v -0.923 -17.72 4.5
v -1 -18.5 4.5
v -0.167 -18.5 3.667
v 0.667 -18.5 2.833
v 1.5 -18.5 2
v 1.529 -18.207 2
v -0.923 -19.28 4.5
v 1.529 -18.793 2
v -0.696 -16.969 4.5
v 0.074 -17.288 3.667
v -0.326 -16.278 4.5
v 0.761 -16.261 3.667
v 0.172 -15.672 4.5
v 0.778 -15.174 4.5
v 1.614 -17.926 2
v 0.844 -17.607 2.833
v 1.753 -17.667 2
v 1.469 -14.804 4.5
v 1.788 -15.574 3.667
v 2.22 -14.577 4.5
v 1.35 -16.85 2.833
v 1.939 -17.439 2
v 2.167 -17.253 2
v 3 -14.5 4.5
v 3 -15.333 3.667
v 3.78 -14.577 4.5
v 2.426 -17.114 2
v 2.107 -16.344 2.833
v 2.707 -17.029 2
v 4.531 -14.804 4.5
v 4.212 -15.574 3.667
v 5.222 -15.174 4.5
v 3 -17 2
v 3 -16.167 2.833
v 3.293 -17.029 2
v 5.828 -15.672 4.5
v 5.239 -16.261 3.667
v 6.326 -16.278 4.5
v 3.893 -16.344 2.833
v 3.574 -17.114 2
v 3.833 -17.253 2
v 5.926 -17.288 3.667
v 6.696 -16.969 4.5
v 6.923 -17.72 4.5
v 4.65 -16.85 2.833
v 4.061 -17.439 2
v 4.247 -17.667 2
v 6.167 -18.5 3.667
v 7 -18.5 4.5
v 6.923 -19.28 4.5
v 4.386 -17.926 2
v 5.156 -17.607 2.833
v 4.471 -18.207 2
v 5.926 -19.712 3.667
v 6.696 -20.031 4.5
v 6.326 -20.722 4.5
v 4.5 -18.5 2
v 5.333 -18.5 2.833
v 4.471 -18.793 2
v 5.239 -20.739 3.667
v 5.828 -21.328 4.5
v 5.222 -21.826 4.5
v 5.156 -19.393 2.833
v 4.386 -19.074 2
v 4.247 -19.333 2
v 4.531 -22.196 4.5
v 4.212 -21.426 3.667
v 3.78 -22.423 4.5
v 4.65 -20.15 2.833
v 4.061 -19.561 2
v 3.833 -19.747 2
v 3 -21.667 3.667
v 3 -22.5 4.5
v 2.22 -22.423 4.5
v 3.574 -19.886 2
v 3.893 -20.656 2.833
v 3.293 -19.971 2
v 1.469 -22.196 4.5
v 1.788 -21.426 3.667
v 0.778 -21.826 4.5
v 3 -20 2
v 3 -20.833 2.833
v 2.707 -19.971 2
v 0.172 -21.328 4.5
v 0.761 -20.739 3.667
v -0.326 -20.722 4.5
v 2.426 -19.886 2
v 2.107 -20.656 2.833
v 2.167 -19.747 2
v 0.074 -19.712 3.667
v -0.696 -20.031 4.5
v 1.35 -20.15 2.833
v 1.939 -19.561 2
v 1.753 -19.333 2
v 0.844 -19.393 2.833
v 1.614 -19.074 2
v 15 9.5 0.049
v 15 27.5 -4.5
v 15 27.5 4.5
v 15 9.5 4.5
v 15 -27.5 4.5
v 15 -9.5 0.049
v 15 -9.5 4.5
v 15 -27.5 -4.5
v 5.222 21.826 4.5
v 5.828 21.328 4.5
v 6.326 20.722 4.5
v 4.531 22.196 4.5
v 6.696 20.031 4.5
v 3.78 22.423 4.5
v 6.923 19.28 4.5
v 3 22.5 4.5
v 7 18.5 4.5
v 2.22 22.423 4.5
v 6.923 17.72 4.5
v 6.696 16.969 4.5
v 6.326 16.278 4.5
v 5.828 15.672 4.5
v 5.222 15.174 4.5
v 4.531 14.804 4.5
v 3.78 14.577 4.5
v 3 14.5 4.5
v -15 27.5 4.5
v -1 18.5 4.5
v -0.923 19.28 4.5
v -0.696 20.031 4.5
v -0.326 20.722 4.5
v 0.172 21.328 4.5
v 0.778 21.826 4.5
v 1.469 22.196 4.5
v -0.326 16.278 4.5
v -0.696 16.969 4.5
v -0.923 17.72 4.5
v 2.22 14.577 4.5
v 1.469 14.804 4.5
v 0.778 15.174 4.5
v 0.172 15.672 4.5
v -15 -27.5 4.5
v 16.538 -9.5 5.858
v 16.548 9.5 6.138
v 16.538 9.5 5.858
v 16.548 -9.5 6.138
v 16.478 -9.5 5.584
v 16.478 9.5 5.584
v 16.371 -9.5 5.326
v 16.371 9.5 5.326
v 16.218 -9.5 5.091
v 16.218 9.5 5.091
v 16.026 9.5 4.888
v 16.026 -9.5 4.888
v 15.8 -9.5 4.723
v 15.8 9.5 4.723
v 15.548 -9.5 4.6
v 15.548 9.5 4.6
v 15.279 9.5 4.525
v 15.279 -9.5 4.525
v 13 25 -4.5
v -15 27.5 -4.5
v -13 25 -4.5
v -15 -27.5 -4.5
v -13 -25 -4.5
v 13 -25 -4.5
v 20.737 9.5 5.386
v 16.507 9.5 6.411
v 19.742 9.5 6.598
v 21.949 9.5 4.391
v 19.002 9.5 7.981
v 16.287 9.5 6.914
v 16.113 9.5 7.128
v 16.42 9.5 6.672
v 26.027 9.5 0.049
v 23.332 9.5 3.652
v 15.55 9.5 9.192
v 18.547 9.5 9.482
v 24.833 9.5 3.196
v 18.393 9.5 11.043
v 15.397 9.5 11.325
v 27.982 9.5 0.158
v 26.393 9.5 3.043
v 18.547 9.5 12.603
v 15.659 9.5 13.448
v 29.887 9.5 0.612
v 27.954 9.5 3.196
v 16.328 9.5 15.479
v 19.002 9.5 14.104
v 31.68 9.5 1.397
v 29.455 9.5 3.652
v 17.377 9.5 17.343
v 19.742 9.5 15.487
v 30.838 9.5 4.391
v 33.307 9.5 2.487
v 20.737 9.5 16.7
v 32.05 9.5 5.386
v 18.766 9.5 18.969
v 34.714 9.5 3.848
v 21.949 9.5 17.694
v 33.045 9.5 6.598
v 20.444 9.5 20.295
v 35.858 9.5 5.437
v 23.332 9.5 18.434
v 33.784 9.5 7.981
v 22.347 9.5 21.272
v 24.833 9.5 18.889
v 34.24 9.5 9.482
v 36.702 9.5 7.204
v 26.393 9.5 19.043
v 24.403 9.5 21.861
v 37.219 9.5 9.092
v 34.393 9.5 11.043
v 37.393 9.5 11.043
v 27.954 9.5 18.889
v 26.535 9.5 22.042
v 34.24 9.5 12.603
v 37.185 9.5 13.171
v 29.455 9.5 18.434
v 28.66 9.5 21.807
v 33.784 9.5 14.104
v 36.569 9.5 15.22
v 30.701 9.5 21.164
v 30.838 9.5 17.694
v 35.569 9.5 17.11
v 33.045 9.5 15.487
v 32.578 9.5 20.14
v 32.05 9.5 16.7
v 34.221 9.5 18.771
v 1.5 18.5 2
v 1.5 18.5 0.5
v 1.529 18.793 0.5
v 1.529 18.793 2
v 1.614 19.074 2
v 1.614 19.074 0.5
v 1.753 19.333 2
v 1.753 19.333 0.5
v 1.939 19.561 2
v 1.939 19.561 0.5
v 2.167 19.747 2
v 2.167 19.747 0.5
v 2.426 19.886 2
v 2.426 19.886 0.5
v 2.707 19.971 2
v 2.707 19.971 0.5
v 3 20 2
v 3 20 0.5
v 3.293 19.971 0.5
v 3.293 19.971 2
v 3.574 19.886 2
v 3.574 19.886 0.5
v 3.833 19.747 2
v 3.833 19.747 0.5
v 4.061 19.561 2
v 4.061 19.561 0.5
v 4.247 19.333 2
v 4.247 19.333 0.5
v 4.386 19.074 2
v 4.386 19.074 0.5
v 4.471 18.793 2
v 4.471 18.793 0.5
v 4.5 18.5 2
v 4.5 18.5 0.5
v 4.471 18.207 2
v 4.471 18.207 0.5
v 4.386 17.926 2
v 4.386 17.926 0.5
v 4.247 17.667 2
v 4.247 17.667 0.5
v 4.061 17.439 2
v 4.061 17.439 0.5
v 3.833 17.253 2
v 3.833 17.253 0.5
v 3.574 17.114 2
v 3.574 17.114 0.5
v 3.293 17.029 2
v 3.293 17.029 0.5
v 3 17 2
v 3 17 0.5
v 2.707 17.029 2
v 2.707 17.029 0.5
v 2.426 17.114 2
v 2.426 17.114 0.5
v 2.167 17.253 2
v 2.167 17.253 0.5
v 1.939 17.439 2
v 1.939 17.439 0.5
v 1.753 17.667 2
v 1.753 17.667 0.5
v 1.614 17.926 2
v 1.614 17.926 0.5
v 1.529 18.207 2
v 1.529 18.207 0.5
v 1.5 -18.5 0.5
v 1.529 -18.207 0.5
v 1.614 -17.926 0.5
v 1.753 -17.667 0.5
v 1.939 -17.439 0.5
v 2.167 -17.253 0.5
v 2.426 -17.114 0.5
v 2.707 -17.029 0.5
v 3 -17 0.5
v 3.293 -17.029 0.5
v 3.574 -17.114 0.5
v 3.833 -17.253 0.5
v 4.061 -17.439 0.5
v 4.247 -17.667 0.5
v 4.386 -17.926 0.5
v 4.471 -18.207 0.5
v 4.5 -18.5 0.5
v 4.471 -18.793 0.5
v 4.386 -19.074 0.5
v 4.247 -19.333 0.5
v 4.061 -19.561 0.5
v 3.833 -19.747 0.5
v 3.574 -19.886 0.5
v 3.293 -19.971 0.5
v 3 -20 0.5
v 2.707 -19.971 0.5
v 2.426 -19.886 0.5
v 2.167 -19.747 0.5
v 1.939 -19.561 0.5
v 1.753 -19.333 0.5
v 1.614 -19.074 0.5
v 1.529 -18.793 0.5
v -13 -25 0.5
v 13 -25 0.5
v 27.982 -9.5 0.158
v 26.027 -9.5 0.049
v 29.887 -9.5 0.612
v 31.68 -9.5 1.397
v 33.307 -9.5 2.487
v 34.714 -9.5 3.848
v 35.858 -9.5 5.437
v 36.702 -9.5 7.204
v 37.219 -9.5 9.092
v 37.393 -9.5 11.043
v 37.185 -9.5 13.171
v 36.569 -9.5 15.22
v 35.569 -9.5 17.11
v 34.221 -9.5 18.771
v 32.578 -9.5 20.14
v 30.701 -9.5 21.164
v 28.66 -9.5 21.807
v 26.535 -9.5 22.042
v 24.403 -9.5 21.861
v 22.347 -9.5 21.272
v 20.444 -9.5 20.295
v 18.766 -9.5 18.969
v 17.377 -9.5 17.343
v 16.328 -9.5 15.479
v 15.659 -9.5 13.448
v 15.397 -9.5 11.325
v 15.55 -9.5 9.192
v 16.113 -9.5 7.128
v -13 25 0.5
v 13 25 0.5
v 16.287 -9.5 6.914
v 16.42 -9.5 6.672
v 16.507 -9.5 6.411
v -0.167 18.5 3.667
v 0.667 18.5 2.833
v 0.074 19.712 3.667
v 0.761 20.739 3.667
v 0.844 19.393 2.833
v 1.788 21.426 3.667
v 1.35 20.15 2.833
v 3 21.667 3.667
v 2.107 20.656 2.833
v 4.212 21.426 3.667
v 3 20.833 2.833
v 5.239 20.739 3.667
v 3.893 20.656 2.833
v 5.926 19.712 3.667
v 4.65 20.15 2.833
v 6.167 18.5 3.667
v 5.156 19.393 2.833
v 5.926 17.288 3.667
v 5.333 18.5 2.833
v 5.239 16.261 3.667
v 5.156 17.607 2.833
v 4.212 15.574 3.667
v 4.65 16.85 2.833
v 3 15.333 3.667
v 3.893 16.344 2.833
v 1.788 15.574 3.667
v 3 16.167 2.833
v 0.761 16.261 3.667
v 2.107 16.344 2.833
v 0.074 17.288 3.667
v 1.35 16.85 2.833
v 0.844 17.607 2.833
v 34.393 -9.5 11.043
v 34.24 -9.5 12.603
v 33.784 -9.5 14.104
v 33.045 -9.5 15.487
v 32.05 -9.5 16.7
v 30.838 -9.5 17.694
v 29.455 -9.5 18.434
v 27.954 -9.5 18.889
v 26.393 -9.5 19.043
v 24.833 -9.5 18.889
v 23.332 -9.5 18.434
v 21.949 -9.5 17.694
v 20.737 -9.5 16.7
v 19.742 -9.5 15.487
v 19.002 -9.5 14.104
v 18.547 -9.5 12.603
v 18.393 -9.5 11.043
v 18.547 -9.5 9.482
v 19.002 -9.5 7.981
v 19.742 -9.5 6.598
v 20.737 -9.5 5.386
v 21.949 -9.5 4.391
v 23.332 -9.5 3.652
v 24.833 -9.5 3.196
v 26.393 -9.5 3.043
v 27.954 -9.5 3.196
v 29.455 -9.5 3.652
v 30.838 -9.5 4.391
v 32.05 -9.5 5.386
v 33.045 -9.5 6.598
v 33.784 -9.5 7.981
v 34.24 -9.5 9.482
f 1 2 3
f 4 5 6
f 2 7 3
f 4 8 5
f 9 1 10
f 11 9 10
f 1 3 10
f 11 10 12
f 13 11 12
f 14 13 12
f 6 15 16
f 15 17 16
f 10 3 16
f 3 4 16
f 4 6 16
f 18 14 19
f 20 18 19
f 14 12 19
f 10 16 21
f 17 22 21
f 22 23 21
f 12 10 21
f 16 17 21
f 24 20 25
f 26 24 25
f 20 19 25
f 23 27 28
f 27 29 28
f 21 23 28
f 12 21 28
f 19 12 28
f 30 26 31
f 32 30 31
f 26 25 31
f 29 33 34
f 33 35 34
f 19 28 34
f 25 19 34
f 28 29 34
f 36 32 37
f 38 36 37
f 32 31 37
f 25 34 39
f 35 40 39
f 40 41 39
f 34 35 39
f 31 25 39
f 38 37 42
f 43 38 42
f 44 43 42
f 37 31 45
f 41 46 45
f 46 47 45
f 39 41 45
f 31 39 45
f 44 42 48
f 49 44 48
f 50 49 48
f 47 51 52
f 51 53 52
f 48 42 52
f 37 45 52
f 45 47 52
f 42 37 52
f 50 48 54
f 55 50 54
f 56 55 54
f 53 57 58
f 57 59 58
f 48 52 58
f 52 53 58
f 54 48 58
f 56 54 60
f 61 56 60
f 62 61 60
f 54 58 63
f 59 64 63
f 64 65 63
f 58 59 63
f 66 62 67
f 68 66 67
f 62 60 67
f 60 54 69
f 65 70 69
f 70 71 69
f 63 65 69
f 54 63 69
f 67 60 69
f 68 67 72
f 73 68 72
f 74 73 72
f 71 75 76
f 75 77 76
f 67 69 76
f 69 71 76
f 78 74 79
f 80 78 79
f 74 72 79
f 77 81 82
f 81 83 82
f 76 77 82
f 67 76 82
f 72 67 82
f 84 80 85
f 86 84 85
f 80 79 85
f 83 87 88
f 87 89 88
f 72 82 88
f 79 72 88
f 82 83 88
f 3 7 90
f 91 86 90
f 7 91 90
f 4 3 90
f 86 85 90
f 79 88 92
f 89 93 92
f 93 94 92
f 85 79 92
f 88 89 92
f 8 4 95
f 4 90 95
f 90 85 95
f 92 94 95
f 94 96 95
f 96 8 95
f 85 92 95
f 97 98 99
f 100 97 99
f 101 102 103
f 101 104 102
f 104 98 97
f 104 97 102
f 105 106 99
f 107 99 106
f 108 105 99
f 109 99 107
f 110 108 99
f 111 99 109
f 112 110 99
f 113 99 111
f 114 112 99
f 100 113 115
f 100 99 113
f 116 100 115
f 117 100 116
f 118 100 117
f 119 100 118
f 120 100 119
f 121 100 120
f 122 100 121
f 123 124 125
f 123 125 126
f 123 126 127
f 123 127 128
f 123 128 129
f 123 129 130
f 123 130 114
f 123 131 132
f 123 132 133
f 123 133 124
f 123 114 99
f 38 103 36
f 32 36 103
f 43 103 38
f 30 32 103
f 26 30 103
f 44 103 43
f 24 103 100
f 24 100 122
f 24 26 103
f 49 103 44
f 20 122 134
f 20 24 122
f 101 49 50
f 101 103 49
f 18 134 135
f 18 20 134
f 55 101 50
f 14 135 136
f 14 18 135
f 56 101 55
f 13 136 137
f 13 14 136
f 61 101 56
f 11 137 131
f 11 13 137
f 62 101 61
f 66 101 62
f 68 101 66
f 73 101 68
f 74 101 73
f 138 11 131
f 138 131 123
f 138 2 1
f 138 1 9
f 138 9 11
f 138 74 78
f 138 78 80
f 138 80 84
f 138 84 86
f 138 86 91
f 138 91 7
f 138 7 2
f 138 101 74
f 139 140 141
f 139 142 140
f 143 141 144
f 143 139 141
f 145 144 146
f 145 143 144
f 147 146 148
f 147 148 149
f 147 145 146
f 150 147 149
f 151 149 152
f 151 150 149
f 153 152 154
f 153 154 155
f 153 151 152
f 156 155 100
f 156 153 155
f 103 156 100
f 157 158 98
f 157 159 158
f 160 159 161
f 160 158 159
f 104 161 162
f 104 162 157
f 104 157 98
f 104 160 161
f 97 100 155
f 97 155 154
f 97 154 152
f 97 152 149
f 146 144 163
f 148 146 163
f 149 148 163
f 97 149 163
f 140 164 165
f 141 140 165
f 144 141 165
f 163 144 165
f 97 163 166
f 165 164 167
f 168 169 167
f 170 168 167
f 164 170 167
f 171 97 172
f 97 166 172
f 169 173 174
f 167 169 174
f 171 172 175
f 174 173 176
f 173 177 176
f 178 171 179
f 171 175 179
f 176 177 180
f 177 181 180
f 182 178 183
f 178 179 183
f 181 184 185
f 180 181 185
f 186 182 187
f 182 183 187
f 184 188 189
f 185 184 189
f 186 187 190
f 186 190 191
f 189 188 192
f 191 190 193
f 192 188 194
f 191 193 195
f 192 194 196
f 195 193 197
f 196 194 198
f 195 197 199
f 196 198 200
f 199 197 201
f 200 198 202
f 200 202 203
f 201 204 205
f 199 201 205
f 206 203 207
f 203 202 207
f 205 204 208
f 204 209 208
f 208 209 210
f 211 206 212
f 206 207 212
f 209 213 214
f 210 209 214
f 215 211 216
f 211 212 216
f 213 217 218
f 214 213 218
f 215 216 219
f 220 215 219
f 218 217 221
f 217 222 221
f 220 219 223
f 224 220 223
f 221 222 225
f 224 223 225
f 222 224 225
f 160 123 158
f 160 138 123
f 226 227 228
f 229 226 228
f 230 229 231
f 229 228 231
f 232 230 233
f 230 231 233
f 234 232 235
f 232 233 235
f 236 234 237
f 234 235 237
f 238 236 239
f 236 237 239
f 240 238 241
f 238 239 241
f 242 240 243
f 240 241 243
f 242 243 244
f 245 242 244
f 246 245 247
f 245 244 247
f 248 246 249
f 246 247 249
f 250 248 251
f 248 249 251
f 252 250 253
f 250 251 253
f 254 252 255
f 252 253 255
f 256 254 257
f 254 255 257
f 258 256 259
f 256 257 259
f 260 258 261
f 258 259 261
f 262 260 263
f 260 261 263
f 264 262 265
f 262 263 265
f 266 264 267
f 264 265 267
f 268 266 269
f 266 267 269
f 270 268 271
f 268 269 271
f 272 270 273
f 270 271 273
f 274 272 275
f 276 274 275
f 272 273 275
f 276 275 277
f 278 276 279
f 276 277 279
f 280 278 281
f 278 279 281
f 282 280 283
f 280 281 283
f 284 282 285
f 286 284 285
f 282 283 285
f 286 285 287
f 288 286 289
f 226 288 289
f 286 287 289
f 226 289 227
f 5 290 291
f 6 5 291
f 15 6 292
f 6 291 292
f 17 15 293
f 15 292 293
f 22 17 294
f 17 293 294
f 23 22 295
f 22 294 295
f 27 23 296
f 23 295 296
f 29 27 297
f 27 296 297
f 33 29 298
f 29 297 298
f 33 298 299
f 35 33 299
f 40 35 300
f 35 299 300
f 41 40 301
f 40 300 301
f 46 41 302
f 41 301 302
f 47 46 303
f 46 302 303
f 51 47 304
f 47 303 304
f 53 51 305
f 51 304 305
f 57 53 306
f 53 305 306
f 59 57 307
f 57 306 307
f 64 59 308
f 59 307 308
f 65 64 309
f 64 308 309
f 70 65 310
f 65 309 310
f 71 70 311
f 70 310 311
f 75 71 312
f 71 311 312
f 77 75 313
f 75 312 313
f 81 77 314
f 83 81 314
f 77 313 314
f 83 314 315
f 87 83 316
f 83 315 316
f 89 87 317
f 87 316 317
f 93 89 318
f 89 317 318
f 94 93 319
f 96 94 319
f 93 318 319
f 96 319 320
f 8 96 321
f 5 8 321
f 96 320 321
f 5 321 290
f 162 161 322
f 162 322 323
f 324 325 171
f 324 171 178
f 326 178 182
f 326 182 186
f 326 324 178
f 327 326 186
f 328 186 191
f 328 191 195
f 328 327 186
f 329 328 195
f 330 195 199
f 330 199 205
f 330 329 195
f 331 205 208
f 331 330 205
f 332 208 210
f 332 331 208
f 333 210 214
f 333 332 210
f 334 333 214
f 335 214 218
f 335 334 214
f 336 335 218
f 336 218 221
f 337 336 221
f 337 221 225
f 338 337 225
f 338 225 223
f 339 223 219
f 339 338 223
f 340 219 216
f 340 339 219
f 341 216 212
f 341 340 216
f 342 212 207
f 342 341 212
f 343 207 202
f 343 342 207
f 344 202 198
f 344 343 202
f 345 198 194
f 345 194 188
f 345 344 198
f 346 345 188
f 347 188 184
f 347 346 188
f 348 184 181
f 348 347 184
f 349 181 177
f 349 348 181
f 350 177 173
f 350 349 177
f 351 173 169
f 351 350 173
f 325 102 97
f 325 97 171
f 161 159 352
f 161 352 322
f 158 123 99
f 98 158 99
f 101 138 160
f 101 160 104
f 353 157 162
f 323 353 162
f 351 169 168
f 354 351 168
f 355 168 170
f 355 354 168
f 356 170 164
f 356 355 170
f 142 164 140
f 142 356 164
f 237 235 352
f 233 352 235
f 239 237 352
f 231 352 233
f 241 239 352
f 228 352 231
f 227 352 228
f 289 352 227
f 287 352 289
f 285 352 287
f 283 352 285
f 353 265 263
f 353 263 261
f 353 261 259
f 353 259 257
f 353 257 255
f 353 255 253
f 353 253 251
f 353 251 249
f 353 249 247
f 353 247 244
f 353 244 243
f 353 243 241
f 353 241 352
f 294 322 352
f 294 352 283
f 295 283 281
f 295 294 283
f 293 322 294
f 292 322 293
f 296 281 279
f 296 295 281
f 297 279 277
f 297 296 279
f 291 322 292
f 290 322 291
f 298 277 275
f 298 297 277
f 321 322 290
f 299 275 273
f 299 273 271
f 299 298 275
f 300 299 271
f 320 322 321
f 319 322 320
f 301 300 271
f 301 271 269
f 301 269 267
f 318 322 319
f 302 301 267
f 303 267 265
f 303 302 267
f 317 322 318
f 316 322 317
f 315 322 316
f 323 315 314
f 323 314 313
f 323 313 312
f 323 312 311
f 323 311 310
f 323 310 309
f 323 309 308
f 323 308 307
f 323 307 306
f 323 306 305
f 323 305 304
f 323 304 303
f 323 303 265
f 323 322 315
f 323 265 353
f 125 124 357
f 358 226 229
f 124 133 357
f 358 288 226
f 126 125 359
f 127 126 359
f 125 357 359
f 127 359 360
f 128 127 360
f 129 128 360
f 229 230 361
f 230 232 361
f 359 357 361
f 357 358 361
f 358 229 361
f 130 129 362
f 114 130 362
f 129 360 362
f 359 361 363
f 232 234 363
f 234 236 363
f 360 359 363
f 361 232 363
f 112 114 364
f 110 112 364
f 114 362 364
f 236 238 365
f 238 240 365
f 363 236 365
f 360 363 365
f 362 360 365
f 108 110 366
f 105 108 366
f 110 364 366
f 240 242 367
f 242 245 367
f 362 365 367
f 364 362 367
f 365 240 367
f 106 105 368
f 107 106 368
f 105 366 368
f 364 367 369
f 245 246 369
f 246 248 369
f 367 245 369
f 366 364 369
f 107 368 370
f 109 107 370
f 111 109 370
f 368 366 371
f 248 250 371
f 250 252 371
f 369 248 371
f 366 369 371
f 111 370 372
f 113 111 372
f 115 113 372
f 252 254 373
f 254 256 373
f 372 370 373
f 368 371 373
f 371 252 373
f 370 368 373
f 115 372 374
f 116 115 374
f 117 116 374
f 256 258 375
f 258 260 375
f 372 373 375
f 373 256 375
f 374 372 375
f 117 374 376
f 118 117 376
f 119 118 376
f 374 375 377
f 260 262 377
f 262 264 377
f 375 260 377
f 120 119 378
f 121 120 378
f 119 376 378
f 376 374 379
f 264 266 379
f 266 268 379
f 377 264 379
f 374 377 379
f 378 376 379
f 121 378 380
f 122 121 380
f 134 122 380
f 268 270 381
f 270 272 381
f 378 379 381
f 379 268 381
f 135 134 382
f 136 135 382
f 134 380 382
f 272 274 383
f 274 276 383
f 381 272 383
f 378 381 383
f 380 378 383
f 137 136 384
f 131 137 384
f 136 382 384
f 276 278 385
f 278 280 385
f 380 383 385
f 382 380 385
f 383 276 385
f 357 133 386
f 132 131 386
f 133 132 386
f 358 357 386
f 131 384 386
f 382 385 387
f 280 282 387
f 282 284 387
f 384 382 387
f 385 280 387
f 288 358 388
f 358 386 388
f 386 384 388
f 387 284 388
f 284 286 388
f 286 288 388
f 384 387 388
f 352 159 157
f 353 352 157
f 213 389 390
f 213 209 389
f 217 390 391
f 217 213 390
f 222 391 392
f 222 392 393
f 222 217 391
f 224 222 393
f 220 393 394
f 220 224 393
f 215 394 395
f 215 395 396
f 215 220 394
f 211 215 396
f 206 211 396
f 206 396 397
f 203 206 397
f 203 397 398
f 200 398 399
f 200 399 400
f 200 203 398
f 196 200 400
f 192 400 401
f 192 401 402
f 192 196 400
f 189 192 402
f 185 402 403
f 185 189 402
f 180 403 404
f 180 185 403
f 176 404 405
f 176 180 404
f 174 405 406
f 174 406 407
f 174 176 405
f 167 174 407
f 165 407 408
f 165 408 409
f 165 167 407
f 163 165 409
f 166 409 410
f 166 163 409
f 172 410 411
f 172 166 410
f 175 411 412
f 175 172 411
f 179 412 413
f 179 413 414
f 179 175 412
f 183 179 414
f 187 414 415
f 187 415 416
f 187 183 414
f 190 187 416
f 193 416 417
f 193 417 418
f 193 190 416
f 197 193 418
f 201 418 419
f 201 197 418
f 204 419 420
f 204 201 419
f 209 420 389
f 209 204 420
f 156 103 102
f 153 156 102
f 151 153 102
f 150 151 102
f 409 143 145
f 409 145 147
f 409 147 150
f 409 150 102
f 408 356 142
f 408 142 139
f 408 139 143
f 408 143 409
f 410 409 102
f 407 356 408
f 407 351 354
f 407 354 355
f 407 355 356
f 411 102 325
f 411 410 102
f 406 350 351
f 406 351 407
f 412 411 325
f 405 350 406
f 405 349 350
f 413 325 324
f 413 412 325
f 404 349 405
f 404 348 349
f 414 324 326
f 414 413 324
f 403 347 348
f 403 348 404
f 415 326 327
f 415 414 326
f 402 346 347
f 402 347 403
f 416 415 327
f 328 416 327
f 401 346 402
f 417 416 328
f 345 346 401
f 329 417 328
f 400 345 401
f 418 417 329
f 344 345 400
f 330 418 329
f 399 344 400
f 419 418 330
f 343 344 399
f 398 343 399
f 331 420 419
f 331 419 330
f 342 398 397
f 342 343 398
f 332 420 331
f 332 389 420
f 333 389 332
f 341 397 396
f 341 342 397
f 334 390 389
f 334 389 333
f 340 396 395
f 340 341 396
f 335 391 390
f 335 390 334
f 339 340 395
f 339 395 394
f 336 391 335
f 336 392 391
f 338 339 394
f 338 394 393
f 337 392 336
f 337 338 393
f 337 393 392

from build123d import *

# Parameters (mm, degrees)
F1_DEPTH       = 27.5
F0_R           = 8
F2_DEPTH       = 9.5
F5_D           = 3
F5_CSINK_D     = 8
F5_CSINK_ANGLE = 90
F6_W           = 26
F6_H           = 50
F6_R           = 1.5
F7_DEPTH       = 5


with BuildPart() as f1:
    # F0 (on Front) → F1 (new body, symmetric)
    with BuildSketch(Plane.XZ):
        Polygon((-15, 4.5), (-15, -4.5), (15, -4.5), (15, 0.0487750938), (15, 4.5), align=None)
    extrude(amount=F1_DEPTH, both=True)

    # F0 (on Front) → F2 (join, symmetric)
    with BuildSketch(Plane.XZ):
        with BuildLine():
            Line((15, 4.5), (15, 0.0487750938))
            Line((15, 0.0487750938), (26.0270317086, 0.0487750938))
            ThreePointArc((26.0270317086, 0.0487750938), (20.4485510909, 1.7874477446), (16.5475113082, 6.1376566135))
            ThreePointArc((16.5475113082, 6.1376566135), (16.1265778305, 4.9854273341), (15, 4.5))
        make_face()
        with BuildLine():
            ThreePointArc((16.5475113082, 6.1376566135), (20.4485510909, 1.7874477446), (26.0270317086, 0.0487750938))
            ThreePointArc((26.0270317086, 0.0487750938), (34.040923726, 3.1360416589), (37.393363731, 11.0426734401))
            ThreePointArc((37.393363731, 11.0426734401), (24.4033695136, 21.8611725511), (16.1133777283, 7.1283551362))
            ThreePointArc((16.1133777283, 7.1283551362), (16.4196666887, 6.6721038843), (16.5475113082, 6.1376566135))
        make_face()
        with Locations((26.393363731, 11.0426734401)):
            Circle(F0_R, mode=Mode.SUBTRACT)
    extrude(amount=F2_DEPTH, both=True)

    # F5 (through all)
    with Locations(Plane.XY.offset(4.5)):
        with Locations((3, 18.5), (3, -18.5)):
            CounterSinkHole(F5_D / 2, F5_CSINK_D / 2, counter_sink_angle=F5_CSINK_ANGLE)

    # F6 (on face) → F7 (cut)
    with BuildSketch(Plane(origin=(0, 0, -4.5), x_dir=(1, 0, 0), z_dir=(0, 0, -1))):
        Rectangle(F6_W, F6_H)
        with Locations((3, -18.5)):
            Circle(F6_R, mode=Mode.SUBTRACT)
        with Locations((3, 18.5)):
            Circle(F6_R, mode=Mode.SUBTRACT)
    extrude(amount=-F7_DEPTH, mode=Mode.SUBTRACT)


solid = f1.part
